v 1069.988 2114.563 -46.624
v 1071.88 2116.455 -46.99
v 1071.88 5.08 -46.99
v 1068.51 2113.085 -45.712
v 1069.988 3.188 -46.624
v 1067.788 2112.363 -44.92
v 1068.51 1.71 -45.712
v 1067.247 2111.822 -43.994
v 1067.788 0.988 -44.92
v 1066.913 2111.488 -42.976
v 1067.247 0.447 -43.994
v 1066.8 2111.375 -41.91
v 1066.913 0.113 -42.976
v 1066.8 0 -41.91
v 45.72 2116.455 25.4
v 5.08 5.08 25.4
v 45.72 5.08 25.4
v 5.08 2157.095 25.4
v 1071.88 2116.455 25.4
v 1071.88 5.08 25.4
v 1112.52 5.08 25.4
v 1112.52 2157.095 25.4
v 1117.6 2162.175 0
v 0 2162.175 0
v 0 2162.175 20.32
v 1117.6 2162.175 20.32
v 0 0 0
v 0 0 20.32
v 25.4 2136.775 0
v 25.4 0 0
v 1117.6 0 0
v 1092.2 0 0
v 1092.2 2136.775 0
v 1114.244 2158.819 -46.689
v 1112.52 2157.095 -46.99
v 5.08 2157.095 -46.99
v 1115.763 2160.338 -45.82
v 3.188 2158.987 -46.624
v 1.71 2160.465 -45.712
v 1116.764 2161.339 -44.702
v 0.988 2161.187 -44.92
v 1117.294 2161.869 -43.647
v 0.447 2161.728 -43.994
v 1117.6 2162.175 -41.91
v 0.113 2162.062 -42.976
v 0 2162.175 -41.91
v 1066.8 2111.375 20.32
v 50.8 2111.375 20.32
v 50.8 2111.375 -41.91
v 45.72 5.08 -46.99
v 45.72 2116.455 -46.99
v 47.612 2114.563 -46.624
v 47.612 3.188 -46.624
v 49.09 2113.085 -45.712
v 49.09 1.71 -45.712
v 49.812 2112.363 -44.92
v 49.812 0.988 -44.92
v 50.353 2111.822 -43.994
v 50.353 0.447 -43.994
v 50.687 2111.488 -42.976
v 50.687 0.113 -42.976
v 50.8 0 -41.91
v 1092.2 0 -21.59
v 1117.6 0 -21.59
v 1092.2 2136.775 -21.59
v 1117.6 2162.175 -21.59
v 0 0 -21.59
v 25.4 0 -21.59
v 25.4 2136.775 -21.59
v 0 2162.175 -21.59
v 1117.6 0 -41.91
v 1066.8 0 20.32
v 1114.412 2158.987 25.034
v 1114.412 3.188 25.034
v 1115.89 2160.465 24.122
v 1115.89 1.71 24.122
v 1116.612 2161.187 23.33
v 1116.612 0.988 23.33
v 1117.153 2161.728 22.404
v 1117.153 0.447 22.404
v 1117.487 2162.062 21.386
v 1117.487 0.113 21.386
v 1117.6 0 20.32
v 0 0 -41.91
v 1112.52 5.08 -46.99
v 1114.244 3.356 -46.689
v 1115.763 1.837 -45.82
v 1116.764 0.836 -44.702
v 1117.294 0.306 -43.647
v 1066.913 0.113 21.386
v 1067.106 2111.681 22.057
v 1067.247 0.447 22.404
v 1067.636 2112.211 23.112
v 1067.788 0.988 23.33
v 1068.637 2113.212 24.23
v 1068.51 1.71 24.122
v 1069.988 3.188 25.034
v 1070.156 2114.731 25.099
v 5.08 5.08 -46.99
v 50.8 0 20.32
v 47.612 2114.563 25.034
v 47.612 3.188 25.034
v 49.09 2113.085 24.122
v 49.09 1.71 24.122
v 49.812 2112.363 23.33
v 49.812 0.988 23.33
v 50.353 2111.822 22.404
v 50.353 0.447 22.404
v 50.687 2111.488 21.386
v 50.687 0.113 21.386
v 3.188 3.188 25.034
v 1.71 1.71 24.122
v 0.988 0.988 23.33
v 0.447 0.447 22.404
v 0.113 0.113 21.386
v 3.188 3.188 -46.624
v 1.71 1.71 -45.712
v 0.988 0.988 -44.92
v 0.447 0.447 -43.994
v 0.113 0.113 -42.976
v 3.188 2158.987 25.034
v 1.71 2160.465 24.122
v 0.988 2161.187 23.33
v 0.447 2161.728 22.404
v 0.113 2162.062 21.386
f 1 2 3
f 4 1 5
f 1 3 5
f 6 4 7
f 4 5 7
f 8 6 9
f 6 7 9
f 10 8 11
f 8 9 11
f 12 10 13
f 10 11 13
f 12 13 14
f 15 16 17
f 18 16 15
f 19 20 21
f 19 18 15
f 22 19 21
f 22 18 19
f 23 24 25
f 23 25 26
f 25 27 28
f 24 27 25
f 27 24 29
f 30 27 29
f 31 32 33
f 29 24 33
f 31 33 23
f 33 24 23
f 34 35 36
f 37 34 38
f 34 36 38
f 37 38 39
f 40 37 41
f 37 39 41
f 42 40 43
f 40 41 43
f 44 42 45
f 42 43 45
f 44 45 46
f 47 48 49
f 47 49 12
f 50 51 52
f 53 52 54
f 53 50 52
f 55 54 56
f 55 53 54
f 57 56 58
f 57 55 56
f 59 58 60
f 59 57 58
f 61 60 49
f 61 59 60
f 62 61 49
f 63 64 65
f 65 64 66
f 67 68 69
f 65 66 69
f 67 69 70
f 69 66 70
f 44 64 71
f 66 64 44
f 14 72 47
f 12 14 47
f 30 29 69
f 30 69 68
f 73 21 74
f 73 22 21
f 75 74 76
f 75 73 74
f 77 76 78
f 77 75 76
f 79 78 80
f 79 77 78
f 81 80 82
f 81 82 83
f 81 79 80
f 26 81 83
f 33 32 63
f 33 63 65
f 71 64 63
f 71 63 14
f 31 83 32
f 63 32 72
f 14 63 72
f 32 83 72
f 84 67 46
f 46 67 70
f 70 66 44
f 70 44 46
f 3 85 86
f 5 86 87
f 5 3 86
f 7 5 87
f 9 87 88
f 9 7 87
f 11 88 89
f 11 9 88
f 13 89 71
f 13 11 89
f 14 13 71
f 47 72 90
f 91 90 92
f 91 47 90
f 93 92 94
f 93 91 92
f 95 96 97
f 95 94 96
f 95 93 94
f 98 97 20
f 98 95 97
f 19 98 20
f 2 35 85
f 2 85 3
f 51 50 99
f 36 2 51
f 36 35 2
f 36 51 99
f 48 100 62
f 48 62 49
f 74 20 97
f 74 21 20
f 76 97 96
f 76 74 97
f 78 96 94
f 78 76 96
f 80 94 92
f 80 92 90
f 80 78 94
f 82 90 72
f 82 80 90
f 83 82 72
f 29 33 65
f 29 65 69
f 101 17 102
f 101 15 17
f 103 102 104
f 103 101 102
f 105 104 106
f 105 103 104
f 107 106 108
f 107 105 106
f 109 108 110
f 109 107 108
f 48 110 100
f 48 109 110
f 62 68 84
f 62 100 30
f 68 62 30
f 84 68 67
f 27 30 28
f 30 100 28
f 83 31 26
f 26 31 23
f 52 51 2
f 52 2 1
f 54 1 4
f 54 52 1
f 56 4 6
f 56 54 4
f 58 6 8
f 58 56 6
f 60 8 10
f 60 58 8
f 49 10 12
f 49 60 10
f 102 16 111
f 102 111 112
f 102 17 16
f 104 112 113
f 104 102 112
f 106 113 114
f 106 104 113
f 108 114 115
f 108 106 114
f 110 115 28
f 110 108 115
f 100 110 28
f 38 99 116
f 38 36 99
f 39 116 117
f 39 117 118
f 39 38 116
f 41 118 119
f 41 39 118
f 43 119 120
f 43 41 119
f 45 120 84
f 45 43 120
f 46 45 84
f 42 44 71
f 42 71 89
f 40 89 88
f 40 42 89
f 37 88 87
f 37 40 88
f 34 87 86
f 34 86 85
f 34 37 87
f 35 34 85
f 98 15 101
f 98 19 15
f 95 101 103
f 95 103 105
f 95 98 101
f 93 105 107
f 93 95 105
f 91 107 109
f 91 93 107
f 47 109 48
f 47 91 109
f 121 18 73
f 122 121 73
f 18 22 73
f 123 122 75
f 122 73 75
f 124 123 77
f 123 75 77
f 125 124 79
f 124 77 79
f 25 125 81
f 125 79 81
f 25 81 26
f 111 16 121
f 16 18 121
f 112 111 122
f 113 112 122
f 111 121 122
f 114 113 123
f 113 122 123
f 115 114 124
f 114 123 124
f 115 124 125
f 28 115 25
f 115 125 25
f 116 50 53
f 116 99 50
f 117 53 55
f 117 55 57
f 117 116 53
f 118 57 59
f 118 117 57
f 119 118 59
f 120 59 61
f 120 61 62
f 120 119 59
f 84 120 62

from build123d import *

# Parameters (mm, degrees)
SKETCH1_W           = 1117.6
SKETCH1_H           = 2162.175
BOSS_EXTRUDE1_DEPTH = 25.4
BOSS_EXTRUDE4_DEPTH = 21.59
SKETCH7_W           = 1117.6
SKETCH7_H           = 2162.175
BOSS_EXTRUDE5_DEPTH = 25.4
SKETCH8_W           = 1016
SKETCH8_H           = 2111.375
CUT_EXTRUDE2_DEPTH  = 2436.009405059
FILLET1_R           = 5.08


with BuildPart() as part:
    # Sketch1 → Boss-Extrude1 (new body)
    with BuildSketch(Plane.XY):
        with Locations((558.8, 1081.0875)):
            Rectangle(SKETCH1_W, SKETCH1_H)
    extrude(amount=BOSS_EXTRUDE1_DEPTH)

    # Sketch6 → Boss-Extrude4 (add)
    with BuildSketch(Plane(origin=(0, 0, 0), x_dir=(-1, 0, 0), z_dir=(0, 0, -1))):
        Polygon((-1066.8, 0), (-1092.2, 0), (-1092.2, 2136.775), (-25.4, 2136.775), (-25.4, 0), (-50.8, 0), (-50.8, 2111.375), (-1066.8, 2111.375), align=None)
    extrude(amount=BOSS_EXTRUDE4_DEPTH)

    # Sketch7 → Boss-Extrude5 (add)
    with BuildSketch(Plane(origin=(0, 0, -21.59), x_dir=(-1, 0, 0), z_dir=(0, 0, -1))):
        with Locations((-558.8, 1081.0875)):
            Rectangle(SKETCH7_W, SKETCH7_H)
    extrude(amount=BOSS_EXTRUDE5_DEPTH)

    # Sketch8 → Cut-Extrude2 (cut, through all)
    with BuildSketch(Plane.XY.offset(25.4)):
        with Locations((558.8, 1055.6875)):
            Rectangle(SKETCH8_W, SKETCH8_H)
    extrude(amount=-CUT_EXTRUDE2_DEPTH, mode=Mode.SUBTRACT)

    # Fillet1
    fillet1_edges = [part.edges().sort_by_distance(p)[0] for p in [
        (1117.6, 1081.0875, 25.4),
        (558.8, 2162.175, 25.4),
        (1117.6, 1081.0875, -46.99),
        (1092.2, 0, -46.99),
        (0, 1081.0875, -46.99),
        (558.8, 2162.175, -46.99),
        (0, 1081.0875, 25.4),
        (25.4, 0, -46.99),
        (1092.2, 0, 25.4),
        (50.8, 1055.6875, -46.99),
        (558.8, 2111.375, -46.99),
        (1066.8, 1055.6875, -46.99),
        (50.8, 1055.6875, 25.4),
        (1066.8, 1055.6875, 25.4),
        (558.8, 2111.375, 25.4),
        (25.4, 0, 25.4),
    ]]
    fillet(fillet1_edges, radius=FILLET1_R)


solid = part.part
